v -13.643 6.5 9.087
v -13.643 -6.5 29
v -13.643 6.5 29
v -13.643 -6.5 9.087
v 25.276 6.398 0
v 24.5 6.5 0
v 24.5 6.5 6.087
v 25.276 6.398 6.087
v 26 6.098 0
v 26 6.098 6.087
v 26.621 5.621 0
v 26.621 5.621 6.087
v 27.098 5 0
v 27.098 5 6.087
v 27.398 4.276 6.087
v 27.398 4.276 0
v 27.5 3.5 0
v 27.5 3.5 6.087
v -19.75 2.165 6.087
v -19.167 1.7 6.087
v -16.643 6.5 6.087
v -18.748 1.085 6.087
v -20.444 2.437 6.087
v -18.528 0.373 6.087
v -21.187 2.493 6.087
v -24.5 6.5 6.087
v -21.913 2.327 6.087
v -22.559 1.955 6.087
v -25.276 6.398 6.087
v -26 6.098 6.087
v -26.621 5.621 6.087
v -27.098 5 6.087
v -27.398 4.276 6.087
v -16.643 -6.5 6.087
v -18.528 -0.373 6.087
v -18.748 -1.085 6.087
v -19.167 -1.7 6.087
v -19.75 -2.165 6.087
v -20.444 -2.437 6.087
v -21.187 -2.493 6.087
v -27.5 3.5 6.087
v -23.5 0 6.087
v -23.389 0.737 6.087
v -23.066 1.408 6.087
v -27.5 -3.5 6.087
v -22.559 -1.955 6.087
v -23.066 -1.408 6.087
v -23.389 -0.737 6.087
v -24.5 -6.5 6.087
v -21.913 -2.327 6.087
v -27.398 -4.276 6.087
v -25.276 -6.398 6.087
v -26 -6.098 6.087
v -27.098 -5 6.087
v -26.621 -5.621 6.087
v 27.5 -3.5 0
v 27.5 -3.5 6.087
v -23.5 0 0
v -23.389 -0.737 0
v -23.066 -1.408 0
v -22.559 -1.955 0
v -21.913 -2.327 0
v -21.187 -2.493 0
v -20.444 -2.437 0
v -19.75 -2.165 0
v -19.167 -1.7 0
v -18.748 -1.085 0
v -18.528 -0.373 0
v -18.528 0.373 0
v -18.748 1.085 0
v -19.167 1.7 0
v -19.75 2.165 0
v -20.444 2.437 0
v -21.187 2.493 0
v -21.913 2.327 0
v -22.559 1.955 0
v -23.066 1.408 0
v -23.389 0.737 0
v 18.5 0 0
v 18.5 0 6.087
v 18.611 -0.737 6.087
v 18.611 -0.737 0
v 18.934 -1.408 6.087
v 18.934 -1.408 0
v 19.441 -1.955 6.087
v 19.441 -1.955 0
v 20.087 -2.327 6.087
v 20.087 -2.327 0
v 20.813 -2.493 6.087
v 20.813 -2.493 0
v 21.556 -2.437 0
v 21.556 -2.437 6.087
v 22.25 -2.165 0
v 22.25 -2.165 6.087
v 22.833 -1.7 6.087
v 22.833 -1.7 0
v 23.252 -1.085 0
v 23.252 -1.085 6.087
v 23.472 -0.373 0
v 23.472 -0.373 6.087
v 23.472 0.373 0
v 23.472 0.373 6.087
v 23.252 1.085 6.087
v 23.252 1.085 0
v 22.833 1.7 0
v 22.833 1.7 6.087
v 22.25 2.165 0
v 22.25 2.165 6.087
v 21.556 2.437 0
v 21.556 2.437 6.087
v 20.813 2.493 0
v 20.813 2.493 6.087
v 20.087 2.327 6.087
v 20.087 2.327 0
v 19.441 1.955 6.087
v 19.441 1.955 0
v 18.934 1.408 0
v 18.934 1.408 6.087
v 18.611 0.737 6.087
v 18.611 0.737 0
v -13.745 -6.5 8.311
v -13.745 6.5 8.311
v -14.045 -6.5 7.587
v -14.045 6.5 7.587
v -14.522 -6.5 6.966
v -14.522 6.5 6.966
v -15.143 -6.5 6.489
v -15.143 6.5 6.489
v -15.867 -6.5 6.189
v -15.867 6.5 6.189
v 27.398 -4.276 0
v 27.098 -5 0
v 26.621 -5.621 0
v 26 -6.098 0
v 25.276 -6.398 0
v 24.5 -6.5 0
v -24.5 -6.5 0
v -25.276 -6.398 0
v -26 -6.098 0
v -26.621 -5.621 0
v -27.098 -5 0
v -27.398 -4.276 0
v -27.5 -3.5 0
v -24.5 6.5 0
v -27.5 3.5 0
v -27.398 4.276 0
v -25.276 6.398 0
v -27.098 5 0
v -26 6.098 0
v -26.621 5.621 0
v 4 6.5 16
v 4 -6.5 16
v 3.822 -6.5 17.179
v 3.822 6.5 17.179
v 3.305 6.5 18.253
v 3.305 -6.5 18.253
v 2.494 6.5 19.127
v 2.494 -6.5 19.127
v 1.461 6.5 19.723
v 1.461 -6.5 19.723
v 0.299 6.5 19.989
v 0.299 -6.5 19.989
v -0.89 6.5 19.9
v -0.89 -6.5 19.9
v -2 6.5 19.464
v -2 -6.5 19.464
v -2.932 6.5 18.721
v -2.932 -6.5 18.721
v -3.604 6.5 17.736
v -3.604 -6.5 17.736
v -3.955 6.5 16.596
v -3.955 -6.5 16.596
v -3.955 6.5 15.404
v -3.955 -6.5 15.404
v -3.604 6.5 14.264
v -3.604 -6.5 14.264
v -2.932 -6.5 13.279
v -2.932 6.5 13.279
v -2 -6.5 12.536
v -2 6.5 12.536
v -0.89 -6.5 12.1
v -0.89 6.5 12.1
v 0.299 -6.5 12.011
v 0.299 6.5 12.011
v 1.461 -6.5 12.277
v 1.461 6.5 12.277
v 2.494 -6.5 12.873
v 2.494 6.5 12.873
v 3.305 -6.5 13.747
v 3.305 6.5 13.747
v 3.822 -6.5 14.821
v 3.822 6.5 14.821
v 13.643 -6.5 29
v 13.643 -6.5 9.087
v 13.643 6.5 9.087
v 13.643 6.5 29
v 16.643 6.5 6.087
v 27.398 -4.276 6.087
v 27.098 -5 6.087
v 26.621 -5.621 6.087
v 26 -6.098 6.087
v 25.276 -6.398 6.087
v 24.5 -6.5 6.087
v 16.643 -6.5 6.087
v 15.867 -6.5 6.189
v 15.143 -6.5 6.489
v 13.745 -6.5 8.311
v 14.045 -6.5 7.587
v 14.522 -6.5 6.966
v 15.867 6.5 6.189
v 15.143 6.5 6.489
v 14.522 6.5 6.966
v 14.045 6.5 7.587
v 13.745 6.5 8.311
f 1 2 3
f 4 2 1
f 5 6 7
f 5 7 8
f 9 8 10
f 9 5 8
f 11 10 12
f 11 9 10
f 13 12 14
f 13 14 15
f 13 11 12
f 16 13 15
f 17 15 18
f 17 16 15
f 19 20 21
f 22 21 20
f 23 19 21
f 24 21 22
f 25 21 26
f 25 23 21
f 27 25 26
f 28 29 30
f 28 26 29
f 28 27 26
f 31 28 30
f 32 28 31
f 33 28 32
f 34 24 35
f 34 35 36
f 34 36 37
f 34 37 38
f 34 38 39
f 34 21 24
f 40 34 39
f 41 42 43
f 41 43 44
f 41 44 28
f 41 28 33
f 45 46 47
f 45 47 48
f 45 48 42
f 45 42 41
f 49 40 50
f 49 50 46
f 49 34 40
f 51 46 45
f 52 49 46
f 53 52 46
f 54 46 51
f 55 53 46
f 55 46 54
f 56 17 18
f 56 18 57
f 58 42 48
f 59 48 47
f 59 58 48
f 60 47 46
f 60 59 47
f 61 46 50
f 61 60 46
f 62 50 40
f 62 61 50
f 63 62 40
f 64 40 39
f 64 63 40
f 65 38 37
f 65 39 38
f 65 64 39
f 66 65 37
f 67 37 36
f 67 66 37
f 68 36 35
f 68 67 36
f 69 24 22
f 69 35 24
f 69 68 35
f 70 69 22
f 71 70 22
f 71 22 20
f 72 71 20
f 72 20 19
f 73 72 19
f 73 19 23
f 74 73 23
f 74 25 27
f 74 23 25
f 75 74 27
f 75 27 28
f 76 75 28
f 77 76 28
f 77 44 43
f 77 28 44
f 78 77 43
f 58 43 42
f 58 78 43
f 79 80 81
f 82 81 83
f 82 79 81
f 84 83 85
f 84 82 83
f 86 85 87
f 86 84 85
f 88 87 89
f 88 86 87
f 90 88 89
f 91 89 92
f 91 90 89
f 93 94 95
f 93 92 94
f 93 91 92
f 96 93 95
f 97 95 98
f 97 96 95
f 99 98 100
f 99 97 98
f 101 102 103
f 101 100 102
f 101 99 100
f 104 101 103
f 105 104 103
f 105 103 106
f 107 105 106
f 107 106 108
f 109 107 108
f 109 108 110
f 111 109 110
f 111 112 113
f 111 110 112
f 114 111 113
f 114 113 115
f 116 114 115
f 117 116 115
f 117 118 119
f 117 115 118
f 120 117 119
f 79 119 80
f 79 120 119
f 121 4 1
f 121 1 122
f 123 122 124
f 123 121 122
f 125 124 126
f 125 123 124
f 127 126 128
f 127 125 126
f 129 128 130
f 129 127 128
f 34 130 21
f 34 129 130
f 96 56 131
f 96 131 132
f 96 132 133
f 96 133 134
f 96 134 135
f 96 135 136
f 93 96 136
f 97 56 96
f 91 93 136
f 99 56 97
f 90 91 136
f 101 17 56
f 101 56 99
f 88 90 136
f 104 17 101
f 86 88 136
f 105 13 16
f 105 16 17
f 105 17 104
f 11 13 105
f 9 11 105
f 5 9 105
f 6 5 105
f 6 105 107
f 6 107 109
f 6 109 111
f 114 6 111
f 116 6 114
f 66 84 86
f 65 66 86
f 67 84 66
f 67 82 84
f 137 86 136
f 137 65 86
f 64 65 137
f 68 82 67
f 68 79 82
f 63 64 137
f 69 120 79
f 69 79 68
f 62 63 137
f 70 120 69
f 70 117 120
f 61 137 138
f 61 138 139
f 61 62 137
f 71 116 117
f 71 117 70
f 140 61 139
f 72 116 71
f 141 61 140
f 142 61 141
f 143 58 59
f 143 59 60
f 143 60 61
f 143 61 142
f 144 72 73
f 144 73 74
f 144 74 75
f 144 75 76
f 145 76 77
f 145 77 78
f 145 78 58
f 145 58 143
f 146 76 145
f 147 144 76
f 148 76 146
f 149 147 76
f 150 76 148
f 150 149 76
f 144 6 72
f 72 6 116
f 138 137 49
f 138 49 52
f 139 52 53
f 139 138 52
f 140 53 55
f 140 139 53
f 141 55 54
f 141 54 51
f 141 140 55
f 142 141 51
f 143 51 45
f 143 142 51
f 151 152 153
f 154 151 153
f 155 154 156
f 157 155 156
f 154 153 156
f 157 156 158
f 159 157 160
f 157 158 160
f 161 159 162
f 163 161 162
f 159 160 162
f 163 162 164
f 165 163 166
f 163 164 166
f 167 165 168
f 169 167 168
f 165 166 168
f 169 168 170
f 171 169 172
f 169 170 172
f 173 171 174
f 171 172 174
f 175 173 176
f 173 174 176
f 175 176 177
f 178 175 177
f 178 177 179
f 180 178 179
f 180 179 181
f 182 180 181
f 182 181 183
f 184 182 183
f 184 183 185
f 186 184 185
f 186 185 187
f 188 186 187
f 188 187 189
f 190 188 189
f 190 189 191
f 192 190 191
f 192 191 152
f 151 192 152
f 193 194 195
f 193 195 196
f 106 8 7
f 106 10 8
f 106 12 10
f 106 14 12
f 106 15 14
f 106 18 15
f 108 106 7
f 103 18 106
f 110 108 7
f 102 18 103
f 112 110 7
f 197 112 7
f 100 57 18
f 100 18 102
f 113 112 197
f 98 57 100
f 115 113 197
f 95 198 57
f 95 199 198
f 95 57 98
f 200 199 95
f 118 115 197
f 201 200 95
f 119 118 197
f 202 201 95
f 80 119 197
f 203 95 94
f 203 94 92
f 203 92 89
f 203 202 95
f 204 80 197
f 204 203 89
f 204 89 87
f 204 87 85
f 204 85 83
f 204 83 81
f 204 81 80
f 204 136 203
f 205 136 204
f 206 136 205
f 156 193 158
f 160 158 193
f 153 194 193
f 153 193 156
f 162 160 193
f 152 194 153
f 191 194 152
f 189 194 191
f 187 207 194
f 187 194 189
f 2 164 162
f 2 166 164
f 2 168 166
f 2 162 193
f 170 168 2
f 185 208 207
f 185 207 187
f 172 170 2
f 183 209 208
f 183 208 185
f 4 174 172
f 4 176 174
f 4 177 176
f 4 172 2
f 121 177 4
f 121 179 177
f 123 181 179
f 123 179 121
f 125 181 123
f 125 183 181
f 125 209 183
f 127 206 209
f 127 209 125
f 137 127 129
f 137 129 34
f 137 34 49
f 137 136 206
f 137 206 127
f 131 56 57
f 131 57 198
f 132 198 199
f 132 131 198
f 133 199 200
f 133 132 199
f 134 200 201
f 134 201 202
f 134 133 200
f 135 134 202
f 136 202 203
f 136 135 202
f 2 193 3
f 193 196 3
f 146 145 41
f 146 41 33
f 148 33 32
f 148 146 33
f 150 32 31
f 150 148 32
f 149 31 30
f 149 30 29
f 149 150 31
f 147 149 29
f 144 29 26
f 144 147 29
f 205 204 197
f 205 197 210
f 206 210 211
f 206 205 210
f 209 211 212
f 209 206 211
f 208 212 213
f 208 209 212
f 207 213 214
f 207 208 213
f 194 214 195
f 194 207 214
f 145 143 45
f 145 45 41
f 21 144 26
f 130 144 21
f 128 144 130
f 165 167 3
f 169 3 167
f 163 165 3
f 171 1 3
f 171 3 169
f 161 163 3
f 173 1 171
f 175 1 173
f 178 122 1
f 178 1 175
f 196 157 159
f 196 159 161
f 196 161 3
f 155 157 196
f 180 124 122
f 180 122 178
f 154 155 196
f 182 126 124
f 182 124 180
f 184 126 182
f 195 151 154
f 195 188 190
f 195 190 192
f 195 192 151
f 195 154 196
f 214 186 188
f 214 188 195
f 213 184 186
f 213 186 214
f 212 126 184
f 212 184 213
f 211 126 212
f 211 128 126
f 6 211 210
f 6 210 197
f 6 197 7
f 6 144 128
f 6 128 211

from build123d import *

# Parameters (mm, degrees)
ESBO_O2_R                = 2.5
RESSALTO_EXTRUS_O1_DEPTH = 29
ESBO_O3_R                = 4
CORTE_EXTRUS_O1_DEPTH    = 43.026777178


with BuildPart() as part:
    # Esboço2 → Ressalto-extrusão1 (new body)
    with BuildSketch(Plane.XY):
        with BuildLine():
            Line((-27.5, -3.5), (-27.5, 3.5))
            ThreePointArc((-27.5, 3.5), (-26.621320344, 5.621320344), (-24.5, 6.5))
            Line((-24.5, 6.5), (24.5, 6.5))
            ThreePointArc((24.5, 6.5), (26.621320344, 5.621320344), (27.5, 3.5))
            Line((27.5, 3.5), (27.5, -3.5))
            ThreePointArc((27.5, -3.5), (26.621320344, -5.621320344), (24.5, -6.5))
            Line((24.5, -6.5), (-24.5, -6.5))
            ThreePointArc((-24.5, -6.5), (-26.621320344, -5.621320344), (-27.5, -3.5))
        make_face()
        with Locations(Location((-21, 0, 0), (0, 0, 180))):
            Circle(ESBO_O2_R, mode=Mode.SUBTRACT)
        with Locations(Location((21, 0, 0), (0, 0, 180))):
            Circle(ESBO_O2_R, mode=Mode.SUBTRACT)
    extrude(amount=RESSALTO_EXTRUS_O1_DEPTH)

    # Esboço3 → Corte-extrusão1 (cut, through all)
    with BuildSketch(Plane.XZ.offset(6.5)):
        with Locations((0, 16)):
            Circle(ESBO_O3_R)
        with BuildLine():
            Line((-27.5, 29), (-13.643156348, 29))
            Line((-13.643156348, 29), (-13.643156348, 9.087055385))
            ThreePointArc((-13.643156348, 9.087055385), (-14.521836004, 6.965735042), (-16.643156348, 6.087055385))
            Line((-16.643156348, 6.087055385), (-27.5, 6.087055385))
            Line((-27.5, 6.087055385), (-27.5, 29))
        make_face()
        with BuildLine():
            Line((27.5, 6.087055385), (16.643156348, 6.087055385))
            ThreePointArc((16.643156348, 6.087055385), (14.521836004, 6.965735042), (13.643156348, 9.087055385))
            Line((13.643156348, 9.087055385), (13.643156348, 29))
            Line((13.643156348, 29), (27.5, 29))
            Line((27.5, 29), (27.5, 6.087055385))
        make_face()
    extrude(amount=-CORTE_EXTRUS_O1_DEPTH, mode=Mode.SUBTRACT)


solid = part.part
